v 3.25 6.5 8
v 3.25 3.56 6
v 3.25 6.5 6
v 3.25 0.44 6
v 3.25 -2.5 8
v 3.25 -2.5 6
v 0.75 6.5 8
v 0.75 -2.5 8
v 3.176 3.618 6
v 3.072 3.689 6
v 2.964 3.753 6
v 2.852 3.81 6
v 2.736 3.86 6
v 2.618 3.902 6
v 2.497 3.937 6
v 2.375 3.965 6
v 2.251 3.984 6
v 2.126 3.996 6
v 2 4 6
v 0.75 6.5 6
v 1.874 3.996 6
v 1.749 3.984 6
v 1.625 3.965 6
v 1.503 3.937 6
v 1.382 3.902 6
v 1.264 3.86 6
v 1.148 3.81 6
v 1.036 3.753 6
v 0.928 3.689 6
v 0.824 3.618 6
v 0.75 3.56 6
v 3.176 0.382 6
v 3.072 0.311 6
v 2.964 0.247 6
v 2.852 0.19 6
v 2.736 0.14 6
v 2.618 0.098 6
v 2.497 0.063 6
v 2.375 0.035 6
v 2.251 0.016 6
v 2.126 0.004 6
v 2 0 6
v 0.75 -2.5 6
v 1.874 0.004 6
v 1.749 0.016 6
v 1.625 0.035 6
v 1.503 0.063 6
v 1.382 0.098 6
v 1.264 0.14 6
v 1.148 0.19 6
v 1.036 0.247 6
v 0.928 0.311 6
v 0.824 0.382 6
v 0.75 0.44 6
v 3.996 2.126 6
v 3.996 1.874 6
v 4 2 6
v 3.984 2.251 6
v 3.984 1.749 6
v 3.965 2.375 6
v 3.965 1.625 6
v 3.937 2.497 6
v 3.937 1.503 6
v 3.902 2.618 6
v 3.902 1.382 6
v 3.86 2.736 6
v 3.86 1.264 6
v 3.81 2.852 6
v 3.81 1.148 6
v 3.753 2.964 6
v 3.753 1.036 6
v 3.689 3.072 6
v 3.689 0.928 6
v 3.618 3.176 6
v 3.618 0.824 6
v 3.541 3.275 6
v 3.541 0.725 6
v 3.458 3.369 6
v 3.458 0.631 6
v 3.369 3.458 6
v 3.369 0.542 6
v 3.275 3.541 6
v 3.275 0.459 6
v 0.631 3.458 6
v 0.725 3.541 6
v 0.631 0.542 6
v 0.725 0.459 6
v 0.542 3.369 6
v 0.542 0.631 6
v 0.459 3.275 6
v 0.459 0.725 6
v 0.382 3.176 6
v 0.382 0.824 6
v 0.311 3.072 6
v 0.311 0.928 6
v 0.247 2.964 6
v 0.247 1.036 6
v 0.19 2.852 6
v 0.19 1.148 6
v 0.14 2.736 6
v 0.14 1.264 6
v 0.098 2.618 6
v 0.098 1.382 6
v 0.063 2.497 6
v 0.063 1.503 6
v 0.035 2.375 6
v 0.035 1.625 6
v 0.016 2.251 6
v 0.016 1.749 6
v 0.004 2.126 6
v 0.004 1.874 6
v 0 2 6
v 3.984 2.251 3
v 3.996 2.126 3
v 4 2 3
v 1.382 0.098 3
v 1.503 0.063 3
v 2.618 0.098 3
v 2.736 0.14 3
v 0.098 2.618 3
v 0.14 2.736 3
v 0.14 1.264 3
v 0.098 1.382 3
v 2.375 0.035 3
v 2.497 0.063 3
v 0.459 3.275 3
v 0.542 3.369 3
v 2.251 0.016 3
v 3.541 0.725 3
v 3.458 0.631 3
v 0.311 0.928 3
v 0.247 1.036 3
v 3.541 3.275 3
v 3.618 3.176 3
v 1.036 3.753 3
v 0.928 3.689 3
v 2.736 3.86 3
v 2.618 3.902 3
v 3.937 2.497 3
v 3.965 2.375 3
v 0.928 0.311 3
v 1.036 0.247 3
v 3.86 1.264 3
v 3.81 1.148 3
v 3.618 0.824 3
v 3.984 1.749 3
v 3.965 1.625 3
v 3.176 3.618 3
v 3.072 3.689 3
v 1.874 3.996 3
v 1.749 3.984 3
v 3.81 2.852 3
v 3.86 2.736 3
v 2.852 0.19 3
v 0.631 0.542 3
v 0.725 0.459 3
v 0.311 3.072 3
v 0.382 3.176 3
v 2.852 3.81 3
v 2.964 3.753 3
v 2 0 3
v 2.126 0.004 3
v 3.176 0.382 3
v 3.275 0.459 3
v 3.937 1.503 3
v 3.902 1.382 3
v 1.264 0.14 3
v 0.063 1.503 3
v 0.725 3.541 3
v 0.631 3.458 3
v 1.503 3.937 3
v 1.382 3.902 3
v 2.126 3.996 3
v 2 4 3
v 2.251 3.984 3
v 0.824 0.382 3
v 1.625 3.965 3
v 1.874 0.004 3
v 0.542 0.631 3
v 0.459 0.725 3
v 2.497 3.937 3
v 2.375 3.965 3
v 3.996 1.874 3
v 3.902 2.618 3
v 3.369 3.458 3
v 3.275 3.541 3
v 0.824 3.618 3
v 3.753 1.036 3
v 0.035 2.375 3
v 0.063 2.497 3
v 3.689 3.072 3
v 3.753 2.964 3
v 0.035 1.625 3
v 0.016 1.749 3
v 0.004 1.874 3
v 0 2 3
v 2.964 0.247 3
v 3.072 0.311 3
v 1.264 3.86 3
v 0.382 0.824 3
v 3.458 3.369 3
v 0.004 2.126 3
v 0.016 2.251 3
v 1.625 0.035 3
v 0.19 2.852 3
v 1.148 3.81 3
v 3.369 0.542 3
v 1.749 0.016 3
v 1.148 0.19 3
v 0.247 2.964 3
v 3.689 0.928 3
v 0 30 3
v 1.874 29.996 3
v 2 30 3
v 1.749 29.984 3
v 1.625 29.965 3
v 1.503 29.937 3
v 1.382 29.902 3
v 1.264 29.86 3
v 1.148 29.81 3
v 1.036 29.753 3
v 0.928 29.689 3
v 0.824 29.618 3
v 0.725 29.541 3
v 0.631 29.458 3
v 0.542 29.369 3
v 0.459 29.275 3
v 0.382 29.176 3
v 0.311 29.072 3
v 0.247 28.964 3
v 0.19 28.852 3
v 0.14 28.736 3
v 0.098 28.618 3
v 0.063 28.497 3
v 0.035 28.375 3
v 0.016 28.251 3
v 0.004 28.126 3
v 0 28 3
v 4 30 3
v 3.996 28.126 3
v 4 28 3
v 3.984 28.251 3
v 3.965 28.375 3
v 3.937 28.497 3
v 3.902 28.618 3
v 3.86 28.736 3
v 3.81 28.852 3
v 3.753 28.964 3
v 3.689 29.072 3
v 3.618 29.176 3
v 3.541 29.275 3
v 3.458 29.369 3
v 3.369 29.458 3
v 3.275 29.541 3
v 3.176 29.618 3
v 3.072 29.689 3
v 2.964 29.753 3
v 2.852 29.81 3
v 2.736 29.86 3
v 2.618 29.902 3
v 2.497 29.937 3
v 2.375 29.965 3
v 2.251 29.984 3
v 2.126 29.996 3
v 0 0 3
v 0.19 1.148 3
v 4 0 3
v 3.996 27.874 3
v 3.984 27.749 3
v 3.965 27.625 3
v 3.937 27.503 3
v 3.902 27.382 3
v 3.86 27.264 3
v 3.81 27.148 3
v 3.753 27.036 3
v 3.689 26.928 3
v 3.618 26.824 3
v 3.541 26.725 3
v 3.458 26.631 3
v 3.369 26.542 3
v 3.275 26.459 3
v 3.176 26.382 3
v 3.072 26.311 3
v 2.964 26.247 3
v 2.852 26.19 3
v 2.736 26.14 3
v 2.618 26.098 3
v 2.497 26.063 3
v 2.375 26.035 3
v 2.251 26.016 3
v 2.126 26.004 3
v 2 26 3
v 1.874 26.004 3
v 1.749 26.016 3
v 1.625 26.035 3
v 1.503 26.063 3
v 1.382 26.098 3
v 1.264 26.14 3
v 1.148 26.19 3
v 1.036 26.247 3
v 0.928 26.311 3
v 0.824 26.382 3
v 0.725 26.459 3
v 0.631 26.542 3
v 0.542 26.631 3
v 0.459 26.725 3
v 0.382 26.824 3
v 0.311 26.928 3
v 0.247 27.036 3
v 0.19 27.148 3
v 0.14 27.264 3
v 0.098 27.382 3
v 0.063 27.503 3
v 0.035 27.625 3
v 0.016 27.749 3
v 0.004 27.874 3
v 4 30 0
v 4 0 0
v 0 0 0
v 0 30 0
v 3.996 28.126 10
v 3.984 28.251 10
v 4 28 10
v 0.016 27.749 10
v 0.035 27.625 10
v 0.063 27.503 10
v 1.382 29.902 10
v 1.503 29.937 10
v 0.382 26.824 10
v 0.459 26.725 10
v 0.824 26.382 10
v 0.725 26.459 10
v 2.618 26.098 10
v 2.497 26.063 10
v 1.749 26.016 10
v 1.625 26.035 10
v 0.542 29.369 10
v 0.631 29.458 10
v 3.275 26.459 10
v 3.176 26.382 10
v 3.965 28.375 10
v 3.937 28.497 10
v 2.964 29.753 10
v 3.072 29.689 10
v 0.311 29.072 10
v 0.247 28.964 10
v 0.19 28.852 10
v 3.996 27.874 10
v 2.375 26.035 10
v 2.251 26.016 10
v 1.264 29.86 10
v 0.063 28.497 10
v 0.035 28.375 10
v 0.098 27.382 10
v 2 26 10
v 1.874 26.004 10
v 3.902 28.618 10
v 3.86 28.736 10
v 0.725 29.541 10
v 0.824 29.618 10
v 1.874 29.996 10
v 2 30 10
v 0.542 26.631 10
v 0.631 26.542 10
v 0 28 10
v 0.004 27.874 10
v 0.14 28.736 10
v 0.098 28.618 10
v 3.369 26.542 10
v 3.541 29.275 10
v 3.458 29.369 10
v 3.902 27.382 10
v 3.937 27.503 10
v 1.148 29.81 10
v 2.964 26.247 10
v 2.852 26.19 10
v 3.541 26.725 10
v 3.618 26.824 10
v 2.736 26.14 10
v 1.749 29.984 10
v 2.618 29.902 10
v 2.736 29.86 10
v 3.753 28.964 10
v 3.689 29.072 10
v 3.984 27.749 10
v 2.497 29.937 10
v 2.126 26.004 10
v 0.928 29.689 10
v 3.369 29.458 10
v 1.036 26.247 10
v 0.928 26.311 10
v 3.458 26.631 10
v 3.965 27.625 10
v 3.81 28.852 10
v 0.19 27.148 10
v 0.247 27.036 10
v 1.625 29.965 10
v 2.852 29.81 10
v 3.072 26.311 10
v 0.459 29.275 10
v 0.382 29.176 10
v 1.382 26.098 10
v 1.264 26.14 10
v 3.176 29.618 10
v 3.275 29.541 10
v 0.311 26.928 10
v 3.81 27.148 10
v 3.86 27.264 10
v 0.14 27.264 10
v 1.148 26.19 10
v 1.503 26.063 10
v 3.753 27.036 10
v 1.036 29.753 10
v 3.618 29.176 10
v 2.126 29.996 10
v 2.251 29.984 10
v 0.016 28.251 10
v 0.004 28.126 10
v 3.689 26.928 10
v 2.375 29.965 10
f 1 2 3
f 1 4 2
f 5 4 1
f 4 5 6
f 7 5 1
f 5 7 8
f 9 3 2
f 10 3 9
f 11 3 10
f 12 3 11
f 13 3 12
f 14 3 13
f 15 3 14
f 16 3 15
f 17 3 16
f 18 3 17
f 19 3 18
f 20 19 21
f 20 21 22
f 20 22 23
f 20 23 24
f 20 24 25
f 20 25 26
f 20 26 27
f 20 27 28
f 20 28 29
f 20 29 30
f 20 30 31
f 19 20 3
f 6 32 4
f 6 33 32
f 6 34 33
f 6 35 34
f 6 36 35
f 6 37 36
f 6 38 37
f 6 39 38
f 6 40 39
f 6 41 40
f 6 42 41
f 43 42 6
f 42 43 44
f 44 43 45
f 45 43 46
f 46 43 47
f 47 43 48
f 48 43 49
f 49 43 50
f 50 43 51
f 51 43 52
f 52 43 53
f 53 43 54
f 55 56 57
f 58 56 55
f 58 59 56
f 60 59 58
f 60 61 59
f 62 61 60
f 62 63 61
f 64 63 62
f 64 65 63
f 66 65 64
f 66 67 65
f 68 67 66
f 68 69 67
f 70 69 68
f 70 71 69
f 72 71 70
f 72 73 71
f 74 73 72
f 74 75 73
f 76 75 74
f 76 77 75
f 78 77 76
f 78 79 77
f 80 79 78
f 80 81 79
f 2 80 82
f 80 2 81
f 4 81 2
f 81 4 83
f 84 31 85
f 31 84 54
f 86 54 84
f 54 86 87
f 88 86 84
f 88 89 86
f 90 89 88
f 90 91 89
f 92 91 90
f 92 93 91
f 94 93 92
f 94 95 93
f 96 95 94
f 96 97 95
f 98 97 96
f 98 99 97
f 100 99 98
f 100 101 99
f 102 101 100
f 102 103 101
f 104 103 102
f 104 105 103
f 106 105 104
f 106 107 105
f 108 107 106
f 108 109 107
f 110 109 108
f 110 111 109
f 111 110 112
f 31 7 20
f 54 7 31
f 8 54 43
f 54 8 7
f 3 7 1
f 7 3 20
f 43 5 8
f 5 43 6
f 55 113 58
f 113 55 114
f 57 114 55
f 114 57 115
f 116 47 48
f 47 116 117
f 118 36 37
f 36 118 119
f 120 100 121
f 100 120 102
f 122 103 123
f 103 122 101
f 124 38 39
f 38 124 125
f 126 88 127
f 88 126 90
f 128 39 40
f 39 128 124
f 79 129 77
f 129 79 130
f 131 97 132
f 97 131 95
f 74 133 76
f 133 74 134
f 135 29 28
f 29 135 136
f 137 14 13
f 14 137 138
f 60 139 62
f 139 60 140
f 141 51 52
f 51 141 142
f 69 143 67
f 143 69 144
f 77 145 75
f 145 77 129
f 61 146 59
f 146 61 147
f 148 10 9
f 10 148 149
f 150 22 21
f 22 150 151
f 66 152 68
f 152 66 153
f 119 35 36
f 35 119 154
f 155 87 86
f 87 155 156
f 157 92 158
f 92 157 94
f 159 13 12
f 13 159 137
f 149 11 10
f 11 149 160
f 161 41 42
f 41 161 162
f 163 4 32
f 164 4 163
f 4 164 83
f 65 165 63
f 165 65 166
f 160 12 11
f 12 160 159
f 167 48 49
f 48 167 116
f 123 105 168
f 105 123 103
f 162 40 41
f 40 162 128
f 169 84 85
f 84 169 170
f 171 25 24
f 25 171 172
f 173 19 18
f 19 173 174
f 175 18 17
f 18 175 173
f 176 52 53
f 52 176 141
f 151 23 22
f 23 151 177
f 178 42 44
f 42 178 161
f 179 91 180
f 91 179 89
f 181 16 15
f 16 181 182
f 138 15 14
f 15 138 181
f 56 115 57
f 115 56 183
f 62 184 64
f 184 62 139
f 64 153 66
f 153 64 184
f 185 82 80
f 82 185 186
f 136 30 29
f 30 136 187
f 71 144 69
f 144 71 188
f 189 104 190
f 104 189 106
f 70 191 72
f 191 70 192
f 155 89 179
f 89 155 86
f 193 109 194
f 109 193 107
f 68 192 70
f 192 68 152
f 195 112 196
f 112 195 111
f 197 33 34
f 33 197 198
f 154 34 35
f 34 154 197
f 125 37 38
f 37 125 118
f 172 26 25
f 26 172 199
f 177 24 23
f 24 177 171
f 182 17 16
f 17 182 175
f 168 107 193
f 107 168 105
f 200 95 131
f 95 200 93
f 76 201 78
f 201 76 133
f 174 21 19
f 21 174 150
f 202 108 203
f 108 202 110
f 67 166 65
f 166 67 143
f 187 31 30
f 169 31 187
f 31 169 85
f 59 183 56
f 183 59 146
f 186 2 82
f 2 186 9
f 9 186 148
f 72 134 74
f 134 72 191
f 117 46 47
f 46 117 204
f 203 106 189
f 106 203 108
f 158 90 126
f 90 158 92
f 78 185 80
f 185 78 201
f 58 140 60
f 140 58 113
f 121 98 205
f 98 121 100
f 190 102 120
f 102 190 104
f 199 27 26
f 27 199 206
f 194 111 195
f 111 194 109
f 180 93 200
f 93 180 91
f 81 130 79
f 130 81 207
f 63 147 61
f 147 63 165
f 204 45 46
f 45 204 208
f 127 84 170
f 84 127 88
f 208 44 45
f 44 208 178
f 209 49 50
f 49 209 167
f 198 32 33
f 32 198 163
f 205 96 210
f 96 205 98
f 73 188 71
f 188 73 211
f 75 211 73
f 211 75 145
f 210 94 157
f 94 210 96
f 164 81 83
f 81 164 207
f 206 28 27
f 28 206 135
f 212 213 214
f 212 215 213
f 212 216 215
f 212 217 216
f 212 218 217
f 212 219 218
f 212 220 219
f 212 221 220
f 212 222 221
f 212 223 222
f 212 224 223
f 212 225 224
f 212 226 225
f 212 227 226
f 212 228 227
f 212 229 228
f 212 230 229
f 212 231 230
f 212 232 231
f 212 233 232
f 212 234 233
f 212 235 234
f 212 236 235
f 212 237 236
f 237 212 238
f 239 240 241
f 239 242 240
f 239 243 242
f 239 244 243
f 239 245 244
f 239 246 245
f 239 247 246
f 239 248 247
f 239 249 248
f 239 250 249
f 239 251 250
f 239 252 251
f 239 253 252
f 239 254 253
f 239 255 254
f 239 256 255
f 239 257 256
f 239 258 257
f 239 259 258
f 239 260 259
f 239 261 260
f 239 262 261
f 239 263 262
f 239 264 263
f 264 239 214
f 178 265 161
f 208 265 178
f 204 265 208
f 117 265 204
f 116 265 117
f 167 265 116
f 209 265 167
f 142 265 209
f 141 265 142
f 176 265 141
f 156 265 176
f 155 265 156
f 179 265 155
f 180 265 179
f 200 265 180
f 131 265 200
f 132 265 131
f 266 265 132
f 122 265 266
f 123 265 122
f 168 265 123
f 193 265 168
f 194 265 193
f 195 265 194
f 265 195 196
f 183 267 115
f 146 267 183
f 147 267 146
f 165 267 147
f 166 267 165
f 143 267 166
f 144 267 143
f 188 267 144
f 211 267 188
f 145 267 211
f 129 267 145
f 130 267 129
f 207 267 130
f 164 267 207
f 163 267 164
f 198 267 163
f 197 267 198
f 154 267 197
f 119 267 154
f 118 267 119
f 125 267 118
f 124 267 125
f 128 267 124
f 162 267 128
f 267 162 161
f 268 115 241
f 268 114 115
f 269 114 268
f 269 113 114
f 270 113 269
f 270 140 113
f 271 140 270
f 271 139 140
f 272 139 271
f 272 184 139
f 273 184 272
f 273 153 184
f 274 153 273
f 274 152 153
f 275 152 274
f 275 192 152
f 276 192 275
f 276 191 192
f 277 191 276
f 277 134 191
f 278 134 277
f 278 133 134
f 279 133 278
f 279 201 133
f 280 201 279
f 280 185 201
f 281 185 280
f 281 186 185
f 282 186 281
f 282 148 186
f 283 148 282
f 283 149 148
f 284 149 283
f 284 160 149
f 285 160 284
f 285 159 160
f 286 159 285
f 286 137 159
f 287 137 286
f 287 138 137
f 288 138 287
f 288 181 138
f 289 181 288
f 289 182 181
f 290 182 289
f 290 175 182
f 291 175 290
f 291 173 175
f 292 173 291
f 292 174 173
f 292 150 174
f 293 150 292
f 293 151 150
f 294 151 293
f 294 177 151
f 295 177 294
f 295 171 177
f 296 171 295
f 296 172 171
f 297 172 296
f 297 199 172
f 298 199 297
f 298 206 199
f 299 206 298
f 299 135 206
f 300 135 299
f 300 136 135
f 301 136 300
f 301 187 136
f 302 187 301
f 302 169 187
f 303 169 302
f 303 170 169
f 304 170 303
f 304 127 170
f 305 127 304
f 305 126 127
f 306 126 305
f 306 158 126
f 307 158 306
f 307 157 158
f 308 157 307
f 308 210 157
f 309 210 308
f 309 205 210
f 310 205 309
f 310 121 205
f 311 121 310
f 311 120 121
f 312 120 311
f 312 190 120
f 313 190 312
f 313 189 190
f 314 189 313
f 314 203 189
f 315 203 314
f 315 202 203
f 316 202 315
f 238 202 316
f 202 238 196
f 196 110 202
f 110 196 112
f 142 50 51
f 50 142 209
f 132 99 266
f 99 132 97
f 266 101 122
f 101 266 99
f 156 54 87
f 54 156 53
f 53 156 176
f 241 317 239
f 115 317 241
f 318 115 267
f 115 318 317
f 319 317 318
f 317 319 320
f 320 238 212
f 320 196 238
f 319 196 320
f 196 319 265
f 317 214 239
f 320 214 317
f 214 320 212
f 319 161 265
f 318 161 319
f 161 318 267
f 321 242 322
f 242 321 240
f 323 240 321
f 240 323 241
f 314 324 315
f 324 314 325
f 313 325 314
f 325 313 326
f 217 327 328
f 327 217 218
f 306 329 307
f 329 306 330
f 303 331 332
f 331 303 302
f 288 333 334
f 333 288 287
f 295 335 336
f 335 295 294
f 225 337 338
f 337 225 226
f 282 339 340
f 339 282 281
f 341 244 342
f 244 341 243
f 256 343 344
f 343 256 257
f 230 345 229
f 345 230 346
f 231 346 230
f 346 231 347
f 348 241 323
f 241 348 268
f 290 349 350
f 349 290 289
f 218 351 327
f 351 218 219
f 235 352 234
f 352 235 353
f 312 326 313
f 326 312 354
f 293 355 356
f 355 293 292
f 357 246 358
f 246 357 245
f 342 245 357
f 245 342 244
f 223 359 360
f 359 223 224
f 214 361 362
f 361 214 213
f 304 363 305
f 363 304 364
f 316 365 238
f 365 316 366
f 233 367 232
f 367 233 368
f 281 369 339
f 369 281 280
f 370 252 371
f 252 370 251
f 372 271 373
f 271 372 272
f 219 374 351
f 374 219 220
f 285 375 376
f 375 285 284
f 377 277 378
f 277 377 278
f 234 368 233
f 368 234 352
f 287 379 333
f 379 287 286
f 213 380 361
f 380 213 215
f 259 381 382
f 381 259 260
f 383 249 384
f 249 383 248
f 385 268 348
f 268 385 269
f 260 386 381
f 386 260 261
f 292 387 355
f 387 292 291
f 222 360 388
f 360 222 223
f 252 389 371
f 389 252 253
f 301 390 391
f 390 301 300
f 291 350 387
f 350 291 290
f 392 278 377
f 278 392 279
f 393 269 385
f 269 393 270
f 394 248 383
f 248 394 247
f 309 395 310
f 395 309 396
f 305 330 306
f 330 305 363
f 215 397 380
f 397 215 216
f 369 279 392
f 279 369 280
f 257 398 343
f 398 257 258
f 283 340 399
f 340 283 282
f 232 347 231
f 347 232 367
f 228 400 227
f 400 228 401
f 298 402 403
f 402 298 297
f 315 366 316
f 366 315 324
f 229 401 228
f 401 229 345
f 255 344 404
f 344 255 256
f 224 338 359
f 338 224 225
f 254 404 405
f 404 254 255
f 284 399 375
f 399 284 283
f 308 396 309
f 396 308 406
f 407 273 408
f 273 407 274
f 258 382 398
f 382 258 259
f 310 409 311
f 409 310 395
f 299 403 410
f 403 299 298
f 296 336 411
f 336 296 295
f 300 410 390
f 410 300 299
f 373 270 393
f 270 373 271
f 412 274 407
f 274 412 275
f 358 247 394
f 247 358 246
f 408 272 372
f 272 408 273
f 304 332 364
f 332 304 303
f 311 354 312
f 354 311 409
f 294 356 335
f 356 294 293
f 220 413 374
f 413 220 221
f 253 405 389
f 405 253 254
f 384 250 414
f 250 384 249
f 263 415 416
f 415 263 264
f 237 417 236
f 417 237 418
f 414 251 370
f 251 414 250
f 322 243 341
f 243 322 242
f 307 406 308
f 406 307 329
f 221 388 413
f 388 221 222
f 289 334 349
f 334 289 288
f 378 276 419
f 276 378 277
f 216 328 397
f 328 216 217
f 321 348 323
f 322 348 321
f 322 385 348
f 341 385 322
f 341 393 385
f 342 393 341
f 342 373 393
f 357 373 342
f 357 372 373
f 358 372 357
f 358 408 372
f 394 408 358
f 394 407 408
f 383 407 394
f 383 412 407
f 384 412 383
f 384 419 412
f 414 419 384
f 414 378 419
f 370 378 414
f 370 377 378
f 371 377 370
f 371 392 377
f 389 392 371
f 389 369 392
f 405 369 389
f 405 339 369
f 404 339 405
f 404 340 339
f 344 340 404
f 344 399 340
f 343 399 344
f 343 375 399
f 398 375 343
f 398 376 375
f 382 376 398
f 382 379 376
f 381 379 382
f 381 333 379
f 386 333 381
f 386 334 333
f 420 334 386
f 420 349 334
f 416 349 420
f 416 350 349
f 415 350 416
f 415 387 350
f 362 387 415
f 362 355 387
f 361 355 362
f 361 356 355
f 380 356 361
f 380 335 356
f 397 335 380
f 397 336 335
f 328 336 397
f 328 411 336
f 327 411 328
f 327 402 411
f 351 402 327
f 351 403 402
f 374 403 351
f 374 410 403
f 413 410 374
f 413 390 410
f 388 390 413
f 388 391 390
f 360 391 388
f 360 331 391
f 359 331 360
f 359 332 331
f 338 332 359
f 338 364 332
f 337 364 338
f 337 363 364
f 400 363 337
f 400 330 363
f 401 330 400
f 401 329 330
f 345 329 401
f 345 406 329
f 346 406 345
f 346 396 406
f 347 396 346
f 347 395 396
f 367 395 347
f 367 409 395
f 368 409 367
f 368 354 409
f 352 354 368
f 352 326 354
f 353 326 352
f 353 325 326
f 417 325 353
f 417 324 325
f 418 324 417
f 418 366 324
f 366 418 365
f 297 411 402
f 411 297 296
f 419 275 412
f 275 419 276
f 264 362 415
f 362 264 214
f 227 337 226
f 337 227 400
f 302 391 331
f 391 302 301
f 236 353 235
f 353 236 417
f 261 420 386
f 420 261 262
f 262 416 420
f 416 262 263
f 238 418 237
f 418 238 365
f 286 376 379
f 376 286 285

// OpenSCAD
trailer_connect_diameter = 4;
trailer_connect_height = 7;

car_connect_axis_diameter = 4;
car_connect_axis_height = 3;

car_connect_holder_width = 2.5;
car_connect_holder_length = 9; // 11;1

car_connect_holder_height = 2;

stick_width = 4;
stick_length = 30;
stick_height = 3;

$fn = 100;

translate([stick_width / 2, car_connect_axis_diameter / 2, stick_height]) {
    translate([-car_connect_holder_width / 2, -car_connect_holder_length / 2, car_connect_axis_height]) cube([car_connect_holder_width, car_connect_holder_length, car_connect_holder_height]);
    cylinder(d=car_connect_axis_diameter, car_connect_axis_height);
}

cube([stick_width, stick_length, stick_height]);

translate([trailer_connect_diameter/ 2, stick_length - trailer_connect_diameter / 2, stick_height]) cylinder(d=trailer_connect_diameter, trailer_connect_height);
